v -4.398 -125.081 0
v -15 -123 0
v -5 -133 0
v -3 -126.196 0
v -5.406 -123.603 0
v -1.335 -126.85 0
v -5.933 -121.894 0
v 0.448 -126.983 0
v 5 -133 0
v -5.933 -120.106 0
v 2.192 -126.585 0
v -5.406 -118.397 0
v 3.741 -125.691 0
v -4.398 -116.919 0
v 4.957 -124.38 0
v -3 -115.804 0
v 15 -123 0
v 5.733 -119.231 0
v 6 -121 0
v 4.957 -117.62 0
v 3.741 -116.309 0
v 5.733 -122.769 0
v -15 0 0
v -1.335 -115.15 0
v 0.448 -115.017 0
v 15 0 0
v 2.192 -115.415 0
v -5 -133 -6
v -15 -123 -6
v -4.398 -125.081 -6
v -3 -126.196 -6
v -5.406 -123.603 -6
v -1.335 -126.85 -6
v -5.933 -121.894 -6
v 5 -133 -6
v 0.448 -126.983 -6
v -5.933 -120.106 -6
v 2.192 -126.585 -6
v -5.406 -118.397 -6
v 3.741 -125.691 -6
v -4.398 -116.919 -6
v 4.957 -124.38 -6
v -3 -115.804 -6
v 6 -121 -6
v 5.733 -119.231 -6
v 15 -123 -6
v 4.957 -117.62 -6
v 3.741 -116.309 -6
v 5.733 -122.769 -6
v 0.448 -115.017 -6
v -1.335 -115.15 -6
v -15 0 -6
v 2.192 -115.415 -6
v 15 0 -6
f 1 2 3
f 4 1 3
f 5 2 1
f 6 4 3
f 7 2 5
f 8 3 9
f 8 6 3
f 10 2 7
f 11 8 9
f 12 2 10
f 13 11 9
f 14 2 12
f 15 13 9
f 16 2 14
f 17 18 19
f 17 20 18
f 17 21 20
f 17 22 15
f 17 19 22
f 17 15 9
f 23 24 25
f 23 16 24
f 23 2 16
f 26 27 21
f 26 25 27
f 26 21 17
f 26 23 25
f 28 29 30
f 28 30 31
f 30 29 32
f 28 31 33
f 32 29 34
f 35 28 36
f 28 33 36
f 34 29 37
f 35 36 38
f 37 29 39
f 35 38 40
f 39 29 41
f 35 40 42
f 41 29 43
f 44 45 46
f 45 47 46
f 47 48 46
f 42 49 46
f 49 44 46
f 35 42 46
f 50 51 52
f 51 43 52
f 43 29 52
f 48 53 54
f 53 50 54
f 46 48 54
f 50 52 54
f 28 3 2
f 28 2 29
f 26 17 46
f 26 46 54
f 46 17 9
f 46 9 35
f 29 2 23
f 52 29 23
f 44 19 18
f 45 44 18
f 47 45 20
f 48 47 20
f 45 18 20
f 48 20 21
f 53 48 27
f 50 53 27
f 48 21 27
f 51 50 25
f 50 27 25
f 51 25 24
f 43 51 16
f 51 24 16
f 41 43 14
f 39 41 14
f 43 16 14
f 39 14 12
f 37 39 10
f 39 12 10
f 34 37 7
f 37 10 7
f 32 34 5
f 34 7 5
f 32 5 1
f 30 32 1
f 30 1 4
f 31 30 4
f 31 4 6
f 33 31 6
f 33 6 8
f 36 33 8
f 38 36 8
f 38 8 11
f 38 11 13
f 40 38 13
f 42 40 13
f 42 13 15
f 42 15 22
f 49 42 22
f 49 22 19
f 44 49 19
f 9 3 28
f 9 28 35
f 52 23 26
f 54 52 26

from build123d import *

# Parameters (mm, degrees)
SKETCH_1_W          = 30
SKETCH_1_H          = 133
EXTRUDE_1_DEPTH     = 6
CHAMFER_1_SIZE      = 10
SKETCH_2_R          = 6
CUT_EXTRUDE_1_DEPTH = 134.97761007


with BuildPart() as part:
    # Эскиз1 → Бобышка-Вытянуть1 (new body)
    with BuildSketch(Plane.XY):
        with Locations((0, -66.5)):
            Rectangle(SKETCH_1_W, SKETCH_1_H)
    extrude(amount=-EXTRUDE_1_DEPTH)

    # Фаска1
    chamfer_1_edges = [part.edges().sort_by_distance(p)[0] for p in [
        (15, -133, -3),
        (-15, -133, -3),
    ]]
    chamfer(chamfer_1_edges, length=CHAMFER_1_SIZE)

    # Эскиз2 → Вырез-Вытянуть1 (cut, through all)
    with BuildSketch(Plane.XY):
        with Locations((0, -121)):
            Circle(SKETCH_2_R)
    extrude(amount=-CUT_EXTRUDE_1_DEPTH, mode=Mode.SUBTRACT)


solid = part.part
